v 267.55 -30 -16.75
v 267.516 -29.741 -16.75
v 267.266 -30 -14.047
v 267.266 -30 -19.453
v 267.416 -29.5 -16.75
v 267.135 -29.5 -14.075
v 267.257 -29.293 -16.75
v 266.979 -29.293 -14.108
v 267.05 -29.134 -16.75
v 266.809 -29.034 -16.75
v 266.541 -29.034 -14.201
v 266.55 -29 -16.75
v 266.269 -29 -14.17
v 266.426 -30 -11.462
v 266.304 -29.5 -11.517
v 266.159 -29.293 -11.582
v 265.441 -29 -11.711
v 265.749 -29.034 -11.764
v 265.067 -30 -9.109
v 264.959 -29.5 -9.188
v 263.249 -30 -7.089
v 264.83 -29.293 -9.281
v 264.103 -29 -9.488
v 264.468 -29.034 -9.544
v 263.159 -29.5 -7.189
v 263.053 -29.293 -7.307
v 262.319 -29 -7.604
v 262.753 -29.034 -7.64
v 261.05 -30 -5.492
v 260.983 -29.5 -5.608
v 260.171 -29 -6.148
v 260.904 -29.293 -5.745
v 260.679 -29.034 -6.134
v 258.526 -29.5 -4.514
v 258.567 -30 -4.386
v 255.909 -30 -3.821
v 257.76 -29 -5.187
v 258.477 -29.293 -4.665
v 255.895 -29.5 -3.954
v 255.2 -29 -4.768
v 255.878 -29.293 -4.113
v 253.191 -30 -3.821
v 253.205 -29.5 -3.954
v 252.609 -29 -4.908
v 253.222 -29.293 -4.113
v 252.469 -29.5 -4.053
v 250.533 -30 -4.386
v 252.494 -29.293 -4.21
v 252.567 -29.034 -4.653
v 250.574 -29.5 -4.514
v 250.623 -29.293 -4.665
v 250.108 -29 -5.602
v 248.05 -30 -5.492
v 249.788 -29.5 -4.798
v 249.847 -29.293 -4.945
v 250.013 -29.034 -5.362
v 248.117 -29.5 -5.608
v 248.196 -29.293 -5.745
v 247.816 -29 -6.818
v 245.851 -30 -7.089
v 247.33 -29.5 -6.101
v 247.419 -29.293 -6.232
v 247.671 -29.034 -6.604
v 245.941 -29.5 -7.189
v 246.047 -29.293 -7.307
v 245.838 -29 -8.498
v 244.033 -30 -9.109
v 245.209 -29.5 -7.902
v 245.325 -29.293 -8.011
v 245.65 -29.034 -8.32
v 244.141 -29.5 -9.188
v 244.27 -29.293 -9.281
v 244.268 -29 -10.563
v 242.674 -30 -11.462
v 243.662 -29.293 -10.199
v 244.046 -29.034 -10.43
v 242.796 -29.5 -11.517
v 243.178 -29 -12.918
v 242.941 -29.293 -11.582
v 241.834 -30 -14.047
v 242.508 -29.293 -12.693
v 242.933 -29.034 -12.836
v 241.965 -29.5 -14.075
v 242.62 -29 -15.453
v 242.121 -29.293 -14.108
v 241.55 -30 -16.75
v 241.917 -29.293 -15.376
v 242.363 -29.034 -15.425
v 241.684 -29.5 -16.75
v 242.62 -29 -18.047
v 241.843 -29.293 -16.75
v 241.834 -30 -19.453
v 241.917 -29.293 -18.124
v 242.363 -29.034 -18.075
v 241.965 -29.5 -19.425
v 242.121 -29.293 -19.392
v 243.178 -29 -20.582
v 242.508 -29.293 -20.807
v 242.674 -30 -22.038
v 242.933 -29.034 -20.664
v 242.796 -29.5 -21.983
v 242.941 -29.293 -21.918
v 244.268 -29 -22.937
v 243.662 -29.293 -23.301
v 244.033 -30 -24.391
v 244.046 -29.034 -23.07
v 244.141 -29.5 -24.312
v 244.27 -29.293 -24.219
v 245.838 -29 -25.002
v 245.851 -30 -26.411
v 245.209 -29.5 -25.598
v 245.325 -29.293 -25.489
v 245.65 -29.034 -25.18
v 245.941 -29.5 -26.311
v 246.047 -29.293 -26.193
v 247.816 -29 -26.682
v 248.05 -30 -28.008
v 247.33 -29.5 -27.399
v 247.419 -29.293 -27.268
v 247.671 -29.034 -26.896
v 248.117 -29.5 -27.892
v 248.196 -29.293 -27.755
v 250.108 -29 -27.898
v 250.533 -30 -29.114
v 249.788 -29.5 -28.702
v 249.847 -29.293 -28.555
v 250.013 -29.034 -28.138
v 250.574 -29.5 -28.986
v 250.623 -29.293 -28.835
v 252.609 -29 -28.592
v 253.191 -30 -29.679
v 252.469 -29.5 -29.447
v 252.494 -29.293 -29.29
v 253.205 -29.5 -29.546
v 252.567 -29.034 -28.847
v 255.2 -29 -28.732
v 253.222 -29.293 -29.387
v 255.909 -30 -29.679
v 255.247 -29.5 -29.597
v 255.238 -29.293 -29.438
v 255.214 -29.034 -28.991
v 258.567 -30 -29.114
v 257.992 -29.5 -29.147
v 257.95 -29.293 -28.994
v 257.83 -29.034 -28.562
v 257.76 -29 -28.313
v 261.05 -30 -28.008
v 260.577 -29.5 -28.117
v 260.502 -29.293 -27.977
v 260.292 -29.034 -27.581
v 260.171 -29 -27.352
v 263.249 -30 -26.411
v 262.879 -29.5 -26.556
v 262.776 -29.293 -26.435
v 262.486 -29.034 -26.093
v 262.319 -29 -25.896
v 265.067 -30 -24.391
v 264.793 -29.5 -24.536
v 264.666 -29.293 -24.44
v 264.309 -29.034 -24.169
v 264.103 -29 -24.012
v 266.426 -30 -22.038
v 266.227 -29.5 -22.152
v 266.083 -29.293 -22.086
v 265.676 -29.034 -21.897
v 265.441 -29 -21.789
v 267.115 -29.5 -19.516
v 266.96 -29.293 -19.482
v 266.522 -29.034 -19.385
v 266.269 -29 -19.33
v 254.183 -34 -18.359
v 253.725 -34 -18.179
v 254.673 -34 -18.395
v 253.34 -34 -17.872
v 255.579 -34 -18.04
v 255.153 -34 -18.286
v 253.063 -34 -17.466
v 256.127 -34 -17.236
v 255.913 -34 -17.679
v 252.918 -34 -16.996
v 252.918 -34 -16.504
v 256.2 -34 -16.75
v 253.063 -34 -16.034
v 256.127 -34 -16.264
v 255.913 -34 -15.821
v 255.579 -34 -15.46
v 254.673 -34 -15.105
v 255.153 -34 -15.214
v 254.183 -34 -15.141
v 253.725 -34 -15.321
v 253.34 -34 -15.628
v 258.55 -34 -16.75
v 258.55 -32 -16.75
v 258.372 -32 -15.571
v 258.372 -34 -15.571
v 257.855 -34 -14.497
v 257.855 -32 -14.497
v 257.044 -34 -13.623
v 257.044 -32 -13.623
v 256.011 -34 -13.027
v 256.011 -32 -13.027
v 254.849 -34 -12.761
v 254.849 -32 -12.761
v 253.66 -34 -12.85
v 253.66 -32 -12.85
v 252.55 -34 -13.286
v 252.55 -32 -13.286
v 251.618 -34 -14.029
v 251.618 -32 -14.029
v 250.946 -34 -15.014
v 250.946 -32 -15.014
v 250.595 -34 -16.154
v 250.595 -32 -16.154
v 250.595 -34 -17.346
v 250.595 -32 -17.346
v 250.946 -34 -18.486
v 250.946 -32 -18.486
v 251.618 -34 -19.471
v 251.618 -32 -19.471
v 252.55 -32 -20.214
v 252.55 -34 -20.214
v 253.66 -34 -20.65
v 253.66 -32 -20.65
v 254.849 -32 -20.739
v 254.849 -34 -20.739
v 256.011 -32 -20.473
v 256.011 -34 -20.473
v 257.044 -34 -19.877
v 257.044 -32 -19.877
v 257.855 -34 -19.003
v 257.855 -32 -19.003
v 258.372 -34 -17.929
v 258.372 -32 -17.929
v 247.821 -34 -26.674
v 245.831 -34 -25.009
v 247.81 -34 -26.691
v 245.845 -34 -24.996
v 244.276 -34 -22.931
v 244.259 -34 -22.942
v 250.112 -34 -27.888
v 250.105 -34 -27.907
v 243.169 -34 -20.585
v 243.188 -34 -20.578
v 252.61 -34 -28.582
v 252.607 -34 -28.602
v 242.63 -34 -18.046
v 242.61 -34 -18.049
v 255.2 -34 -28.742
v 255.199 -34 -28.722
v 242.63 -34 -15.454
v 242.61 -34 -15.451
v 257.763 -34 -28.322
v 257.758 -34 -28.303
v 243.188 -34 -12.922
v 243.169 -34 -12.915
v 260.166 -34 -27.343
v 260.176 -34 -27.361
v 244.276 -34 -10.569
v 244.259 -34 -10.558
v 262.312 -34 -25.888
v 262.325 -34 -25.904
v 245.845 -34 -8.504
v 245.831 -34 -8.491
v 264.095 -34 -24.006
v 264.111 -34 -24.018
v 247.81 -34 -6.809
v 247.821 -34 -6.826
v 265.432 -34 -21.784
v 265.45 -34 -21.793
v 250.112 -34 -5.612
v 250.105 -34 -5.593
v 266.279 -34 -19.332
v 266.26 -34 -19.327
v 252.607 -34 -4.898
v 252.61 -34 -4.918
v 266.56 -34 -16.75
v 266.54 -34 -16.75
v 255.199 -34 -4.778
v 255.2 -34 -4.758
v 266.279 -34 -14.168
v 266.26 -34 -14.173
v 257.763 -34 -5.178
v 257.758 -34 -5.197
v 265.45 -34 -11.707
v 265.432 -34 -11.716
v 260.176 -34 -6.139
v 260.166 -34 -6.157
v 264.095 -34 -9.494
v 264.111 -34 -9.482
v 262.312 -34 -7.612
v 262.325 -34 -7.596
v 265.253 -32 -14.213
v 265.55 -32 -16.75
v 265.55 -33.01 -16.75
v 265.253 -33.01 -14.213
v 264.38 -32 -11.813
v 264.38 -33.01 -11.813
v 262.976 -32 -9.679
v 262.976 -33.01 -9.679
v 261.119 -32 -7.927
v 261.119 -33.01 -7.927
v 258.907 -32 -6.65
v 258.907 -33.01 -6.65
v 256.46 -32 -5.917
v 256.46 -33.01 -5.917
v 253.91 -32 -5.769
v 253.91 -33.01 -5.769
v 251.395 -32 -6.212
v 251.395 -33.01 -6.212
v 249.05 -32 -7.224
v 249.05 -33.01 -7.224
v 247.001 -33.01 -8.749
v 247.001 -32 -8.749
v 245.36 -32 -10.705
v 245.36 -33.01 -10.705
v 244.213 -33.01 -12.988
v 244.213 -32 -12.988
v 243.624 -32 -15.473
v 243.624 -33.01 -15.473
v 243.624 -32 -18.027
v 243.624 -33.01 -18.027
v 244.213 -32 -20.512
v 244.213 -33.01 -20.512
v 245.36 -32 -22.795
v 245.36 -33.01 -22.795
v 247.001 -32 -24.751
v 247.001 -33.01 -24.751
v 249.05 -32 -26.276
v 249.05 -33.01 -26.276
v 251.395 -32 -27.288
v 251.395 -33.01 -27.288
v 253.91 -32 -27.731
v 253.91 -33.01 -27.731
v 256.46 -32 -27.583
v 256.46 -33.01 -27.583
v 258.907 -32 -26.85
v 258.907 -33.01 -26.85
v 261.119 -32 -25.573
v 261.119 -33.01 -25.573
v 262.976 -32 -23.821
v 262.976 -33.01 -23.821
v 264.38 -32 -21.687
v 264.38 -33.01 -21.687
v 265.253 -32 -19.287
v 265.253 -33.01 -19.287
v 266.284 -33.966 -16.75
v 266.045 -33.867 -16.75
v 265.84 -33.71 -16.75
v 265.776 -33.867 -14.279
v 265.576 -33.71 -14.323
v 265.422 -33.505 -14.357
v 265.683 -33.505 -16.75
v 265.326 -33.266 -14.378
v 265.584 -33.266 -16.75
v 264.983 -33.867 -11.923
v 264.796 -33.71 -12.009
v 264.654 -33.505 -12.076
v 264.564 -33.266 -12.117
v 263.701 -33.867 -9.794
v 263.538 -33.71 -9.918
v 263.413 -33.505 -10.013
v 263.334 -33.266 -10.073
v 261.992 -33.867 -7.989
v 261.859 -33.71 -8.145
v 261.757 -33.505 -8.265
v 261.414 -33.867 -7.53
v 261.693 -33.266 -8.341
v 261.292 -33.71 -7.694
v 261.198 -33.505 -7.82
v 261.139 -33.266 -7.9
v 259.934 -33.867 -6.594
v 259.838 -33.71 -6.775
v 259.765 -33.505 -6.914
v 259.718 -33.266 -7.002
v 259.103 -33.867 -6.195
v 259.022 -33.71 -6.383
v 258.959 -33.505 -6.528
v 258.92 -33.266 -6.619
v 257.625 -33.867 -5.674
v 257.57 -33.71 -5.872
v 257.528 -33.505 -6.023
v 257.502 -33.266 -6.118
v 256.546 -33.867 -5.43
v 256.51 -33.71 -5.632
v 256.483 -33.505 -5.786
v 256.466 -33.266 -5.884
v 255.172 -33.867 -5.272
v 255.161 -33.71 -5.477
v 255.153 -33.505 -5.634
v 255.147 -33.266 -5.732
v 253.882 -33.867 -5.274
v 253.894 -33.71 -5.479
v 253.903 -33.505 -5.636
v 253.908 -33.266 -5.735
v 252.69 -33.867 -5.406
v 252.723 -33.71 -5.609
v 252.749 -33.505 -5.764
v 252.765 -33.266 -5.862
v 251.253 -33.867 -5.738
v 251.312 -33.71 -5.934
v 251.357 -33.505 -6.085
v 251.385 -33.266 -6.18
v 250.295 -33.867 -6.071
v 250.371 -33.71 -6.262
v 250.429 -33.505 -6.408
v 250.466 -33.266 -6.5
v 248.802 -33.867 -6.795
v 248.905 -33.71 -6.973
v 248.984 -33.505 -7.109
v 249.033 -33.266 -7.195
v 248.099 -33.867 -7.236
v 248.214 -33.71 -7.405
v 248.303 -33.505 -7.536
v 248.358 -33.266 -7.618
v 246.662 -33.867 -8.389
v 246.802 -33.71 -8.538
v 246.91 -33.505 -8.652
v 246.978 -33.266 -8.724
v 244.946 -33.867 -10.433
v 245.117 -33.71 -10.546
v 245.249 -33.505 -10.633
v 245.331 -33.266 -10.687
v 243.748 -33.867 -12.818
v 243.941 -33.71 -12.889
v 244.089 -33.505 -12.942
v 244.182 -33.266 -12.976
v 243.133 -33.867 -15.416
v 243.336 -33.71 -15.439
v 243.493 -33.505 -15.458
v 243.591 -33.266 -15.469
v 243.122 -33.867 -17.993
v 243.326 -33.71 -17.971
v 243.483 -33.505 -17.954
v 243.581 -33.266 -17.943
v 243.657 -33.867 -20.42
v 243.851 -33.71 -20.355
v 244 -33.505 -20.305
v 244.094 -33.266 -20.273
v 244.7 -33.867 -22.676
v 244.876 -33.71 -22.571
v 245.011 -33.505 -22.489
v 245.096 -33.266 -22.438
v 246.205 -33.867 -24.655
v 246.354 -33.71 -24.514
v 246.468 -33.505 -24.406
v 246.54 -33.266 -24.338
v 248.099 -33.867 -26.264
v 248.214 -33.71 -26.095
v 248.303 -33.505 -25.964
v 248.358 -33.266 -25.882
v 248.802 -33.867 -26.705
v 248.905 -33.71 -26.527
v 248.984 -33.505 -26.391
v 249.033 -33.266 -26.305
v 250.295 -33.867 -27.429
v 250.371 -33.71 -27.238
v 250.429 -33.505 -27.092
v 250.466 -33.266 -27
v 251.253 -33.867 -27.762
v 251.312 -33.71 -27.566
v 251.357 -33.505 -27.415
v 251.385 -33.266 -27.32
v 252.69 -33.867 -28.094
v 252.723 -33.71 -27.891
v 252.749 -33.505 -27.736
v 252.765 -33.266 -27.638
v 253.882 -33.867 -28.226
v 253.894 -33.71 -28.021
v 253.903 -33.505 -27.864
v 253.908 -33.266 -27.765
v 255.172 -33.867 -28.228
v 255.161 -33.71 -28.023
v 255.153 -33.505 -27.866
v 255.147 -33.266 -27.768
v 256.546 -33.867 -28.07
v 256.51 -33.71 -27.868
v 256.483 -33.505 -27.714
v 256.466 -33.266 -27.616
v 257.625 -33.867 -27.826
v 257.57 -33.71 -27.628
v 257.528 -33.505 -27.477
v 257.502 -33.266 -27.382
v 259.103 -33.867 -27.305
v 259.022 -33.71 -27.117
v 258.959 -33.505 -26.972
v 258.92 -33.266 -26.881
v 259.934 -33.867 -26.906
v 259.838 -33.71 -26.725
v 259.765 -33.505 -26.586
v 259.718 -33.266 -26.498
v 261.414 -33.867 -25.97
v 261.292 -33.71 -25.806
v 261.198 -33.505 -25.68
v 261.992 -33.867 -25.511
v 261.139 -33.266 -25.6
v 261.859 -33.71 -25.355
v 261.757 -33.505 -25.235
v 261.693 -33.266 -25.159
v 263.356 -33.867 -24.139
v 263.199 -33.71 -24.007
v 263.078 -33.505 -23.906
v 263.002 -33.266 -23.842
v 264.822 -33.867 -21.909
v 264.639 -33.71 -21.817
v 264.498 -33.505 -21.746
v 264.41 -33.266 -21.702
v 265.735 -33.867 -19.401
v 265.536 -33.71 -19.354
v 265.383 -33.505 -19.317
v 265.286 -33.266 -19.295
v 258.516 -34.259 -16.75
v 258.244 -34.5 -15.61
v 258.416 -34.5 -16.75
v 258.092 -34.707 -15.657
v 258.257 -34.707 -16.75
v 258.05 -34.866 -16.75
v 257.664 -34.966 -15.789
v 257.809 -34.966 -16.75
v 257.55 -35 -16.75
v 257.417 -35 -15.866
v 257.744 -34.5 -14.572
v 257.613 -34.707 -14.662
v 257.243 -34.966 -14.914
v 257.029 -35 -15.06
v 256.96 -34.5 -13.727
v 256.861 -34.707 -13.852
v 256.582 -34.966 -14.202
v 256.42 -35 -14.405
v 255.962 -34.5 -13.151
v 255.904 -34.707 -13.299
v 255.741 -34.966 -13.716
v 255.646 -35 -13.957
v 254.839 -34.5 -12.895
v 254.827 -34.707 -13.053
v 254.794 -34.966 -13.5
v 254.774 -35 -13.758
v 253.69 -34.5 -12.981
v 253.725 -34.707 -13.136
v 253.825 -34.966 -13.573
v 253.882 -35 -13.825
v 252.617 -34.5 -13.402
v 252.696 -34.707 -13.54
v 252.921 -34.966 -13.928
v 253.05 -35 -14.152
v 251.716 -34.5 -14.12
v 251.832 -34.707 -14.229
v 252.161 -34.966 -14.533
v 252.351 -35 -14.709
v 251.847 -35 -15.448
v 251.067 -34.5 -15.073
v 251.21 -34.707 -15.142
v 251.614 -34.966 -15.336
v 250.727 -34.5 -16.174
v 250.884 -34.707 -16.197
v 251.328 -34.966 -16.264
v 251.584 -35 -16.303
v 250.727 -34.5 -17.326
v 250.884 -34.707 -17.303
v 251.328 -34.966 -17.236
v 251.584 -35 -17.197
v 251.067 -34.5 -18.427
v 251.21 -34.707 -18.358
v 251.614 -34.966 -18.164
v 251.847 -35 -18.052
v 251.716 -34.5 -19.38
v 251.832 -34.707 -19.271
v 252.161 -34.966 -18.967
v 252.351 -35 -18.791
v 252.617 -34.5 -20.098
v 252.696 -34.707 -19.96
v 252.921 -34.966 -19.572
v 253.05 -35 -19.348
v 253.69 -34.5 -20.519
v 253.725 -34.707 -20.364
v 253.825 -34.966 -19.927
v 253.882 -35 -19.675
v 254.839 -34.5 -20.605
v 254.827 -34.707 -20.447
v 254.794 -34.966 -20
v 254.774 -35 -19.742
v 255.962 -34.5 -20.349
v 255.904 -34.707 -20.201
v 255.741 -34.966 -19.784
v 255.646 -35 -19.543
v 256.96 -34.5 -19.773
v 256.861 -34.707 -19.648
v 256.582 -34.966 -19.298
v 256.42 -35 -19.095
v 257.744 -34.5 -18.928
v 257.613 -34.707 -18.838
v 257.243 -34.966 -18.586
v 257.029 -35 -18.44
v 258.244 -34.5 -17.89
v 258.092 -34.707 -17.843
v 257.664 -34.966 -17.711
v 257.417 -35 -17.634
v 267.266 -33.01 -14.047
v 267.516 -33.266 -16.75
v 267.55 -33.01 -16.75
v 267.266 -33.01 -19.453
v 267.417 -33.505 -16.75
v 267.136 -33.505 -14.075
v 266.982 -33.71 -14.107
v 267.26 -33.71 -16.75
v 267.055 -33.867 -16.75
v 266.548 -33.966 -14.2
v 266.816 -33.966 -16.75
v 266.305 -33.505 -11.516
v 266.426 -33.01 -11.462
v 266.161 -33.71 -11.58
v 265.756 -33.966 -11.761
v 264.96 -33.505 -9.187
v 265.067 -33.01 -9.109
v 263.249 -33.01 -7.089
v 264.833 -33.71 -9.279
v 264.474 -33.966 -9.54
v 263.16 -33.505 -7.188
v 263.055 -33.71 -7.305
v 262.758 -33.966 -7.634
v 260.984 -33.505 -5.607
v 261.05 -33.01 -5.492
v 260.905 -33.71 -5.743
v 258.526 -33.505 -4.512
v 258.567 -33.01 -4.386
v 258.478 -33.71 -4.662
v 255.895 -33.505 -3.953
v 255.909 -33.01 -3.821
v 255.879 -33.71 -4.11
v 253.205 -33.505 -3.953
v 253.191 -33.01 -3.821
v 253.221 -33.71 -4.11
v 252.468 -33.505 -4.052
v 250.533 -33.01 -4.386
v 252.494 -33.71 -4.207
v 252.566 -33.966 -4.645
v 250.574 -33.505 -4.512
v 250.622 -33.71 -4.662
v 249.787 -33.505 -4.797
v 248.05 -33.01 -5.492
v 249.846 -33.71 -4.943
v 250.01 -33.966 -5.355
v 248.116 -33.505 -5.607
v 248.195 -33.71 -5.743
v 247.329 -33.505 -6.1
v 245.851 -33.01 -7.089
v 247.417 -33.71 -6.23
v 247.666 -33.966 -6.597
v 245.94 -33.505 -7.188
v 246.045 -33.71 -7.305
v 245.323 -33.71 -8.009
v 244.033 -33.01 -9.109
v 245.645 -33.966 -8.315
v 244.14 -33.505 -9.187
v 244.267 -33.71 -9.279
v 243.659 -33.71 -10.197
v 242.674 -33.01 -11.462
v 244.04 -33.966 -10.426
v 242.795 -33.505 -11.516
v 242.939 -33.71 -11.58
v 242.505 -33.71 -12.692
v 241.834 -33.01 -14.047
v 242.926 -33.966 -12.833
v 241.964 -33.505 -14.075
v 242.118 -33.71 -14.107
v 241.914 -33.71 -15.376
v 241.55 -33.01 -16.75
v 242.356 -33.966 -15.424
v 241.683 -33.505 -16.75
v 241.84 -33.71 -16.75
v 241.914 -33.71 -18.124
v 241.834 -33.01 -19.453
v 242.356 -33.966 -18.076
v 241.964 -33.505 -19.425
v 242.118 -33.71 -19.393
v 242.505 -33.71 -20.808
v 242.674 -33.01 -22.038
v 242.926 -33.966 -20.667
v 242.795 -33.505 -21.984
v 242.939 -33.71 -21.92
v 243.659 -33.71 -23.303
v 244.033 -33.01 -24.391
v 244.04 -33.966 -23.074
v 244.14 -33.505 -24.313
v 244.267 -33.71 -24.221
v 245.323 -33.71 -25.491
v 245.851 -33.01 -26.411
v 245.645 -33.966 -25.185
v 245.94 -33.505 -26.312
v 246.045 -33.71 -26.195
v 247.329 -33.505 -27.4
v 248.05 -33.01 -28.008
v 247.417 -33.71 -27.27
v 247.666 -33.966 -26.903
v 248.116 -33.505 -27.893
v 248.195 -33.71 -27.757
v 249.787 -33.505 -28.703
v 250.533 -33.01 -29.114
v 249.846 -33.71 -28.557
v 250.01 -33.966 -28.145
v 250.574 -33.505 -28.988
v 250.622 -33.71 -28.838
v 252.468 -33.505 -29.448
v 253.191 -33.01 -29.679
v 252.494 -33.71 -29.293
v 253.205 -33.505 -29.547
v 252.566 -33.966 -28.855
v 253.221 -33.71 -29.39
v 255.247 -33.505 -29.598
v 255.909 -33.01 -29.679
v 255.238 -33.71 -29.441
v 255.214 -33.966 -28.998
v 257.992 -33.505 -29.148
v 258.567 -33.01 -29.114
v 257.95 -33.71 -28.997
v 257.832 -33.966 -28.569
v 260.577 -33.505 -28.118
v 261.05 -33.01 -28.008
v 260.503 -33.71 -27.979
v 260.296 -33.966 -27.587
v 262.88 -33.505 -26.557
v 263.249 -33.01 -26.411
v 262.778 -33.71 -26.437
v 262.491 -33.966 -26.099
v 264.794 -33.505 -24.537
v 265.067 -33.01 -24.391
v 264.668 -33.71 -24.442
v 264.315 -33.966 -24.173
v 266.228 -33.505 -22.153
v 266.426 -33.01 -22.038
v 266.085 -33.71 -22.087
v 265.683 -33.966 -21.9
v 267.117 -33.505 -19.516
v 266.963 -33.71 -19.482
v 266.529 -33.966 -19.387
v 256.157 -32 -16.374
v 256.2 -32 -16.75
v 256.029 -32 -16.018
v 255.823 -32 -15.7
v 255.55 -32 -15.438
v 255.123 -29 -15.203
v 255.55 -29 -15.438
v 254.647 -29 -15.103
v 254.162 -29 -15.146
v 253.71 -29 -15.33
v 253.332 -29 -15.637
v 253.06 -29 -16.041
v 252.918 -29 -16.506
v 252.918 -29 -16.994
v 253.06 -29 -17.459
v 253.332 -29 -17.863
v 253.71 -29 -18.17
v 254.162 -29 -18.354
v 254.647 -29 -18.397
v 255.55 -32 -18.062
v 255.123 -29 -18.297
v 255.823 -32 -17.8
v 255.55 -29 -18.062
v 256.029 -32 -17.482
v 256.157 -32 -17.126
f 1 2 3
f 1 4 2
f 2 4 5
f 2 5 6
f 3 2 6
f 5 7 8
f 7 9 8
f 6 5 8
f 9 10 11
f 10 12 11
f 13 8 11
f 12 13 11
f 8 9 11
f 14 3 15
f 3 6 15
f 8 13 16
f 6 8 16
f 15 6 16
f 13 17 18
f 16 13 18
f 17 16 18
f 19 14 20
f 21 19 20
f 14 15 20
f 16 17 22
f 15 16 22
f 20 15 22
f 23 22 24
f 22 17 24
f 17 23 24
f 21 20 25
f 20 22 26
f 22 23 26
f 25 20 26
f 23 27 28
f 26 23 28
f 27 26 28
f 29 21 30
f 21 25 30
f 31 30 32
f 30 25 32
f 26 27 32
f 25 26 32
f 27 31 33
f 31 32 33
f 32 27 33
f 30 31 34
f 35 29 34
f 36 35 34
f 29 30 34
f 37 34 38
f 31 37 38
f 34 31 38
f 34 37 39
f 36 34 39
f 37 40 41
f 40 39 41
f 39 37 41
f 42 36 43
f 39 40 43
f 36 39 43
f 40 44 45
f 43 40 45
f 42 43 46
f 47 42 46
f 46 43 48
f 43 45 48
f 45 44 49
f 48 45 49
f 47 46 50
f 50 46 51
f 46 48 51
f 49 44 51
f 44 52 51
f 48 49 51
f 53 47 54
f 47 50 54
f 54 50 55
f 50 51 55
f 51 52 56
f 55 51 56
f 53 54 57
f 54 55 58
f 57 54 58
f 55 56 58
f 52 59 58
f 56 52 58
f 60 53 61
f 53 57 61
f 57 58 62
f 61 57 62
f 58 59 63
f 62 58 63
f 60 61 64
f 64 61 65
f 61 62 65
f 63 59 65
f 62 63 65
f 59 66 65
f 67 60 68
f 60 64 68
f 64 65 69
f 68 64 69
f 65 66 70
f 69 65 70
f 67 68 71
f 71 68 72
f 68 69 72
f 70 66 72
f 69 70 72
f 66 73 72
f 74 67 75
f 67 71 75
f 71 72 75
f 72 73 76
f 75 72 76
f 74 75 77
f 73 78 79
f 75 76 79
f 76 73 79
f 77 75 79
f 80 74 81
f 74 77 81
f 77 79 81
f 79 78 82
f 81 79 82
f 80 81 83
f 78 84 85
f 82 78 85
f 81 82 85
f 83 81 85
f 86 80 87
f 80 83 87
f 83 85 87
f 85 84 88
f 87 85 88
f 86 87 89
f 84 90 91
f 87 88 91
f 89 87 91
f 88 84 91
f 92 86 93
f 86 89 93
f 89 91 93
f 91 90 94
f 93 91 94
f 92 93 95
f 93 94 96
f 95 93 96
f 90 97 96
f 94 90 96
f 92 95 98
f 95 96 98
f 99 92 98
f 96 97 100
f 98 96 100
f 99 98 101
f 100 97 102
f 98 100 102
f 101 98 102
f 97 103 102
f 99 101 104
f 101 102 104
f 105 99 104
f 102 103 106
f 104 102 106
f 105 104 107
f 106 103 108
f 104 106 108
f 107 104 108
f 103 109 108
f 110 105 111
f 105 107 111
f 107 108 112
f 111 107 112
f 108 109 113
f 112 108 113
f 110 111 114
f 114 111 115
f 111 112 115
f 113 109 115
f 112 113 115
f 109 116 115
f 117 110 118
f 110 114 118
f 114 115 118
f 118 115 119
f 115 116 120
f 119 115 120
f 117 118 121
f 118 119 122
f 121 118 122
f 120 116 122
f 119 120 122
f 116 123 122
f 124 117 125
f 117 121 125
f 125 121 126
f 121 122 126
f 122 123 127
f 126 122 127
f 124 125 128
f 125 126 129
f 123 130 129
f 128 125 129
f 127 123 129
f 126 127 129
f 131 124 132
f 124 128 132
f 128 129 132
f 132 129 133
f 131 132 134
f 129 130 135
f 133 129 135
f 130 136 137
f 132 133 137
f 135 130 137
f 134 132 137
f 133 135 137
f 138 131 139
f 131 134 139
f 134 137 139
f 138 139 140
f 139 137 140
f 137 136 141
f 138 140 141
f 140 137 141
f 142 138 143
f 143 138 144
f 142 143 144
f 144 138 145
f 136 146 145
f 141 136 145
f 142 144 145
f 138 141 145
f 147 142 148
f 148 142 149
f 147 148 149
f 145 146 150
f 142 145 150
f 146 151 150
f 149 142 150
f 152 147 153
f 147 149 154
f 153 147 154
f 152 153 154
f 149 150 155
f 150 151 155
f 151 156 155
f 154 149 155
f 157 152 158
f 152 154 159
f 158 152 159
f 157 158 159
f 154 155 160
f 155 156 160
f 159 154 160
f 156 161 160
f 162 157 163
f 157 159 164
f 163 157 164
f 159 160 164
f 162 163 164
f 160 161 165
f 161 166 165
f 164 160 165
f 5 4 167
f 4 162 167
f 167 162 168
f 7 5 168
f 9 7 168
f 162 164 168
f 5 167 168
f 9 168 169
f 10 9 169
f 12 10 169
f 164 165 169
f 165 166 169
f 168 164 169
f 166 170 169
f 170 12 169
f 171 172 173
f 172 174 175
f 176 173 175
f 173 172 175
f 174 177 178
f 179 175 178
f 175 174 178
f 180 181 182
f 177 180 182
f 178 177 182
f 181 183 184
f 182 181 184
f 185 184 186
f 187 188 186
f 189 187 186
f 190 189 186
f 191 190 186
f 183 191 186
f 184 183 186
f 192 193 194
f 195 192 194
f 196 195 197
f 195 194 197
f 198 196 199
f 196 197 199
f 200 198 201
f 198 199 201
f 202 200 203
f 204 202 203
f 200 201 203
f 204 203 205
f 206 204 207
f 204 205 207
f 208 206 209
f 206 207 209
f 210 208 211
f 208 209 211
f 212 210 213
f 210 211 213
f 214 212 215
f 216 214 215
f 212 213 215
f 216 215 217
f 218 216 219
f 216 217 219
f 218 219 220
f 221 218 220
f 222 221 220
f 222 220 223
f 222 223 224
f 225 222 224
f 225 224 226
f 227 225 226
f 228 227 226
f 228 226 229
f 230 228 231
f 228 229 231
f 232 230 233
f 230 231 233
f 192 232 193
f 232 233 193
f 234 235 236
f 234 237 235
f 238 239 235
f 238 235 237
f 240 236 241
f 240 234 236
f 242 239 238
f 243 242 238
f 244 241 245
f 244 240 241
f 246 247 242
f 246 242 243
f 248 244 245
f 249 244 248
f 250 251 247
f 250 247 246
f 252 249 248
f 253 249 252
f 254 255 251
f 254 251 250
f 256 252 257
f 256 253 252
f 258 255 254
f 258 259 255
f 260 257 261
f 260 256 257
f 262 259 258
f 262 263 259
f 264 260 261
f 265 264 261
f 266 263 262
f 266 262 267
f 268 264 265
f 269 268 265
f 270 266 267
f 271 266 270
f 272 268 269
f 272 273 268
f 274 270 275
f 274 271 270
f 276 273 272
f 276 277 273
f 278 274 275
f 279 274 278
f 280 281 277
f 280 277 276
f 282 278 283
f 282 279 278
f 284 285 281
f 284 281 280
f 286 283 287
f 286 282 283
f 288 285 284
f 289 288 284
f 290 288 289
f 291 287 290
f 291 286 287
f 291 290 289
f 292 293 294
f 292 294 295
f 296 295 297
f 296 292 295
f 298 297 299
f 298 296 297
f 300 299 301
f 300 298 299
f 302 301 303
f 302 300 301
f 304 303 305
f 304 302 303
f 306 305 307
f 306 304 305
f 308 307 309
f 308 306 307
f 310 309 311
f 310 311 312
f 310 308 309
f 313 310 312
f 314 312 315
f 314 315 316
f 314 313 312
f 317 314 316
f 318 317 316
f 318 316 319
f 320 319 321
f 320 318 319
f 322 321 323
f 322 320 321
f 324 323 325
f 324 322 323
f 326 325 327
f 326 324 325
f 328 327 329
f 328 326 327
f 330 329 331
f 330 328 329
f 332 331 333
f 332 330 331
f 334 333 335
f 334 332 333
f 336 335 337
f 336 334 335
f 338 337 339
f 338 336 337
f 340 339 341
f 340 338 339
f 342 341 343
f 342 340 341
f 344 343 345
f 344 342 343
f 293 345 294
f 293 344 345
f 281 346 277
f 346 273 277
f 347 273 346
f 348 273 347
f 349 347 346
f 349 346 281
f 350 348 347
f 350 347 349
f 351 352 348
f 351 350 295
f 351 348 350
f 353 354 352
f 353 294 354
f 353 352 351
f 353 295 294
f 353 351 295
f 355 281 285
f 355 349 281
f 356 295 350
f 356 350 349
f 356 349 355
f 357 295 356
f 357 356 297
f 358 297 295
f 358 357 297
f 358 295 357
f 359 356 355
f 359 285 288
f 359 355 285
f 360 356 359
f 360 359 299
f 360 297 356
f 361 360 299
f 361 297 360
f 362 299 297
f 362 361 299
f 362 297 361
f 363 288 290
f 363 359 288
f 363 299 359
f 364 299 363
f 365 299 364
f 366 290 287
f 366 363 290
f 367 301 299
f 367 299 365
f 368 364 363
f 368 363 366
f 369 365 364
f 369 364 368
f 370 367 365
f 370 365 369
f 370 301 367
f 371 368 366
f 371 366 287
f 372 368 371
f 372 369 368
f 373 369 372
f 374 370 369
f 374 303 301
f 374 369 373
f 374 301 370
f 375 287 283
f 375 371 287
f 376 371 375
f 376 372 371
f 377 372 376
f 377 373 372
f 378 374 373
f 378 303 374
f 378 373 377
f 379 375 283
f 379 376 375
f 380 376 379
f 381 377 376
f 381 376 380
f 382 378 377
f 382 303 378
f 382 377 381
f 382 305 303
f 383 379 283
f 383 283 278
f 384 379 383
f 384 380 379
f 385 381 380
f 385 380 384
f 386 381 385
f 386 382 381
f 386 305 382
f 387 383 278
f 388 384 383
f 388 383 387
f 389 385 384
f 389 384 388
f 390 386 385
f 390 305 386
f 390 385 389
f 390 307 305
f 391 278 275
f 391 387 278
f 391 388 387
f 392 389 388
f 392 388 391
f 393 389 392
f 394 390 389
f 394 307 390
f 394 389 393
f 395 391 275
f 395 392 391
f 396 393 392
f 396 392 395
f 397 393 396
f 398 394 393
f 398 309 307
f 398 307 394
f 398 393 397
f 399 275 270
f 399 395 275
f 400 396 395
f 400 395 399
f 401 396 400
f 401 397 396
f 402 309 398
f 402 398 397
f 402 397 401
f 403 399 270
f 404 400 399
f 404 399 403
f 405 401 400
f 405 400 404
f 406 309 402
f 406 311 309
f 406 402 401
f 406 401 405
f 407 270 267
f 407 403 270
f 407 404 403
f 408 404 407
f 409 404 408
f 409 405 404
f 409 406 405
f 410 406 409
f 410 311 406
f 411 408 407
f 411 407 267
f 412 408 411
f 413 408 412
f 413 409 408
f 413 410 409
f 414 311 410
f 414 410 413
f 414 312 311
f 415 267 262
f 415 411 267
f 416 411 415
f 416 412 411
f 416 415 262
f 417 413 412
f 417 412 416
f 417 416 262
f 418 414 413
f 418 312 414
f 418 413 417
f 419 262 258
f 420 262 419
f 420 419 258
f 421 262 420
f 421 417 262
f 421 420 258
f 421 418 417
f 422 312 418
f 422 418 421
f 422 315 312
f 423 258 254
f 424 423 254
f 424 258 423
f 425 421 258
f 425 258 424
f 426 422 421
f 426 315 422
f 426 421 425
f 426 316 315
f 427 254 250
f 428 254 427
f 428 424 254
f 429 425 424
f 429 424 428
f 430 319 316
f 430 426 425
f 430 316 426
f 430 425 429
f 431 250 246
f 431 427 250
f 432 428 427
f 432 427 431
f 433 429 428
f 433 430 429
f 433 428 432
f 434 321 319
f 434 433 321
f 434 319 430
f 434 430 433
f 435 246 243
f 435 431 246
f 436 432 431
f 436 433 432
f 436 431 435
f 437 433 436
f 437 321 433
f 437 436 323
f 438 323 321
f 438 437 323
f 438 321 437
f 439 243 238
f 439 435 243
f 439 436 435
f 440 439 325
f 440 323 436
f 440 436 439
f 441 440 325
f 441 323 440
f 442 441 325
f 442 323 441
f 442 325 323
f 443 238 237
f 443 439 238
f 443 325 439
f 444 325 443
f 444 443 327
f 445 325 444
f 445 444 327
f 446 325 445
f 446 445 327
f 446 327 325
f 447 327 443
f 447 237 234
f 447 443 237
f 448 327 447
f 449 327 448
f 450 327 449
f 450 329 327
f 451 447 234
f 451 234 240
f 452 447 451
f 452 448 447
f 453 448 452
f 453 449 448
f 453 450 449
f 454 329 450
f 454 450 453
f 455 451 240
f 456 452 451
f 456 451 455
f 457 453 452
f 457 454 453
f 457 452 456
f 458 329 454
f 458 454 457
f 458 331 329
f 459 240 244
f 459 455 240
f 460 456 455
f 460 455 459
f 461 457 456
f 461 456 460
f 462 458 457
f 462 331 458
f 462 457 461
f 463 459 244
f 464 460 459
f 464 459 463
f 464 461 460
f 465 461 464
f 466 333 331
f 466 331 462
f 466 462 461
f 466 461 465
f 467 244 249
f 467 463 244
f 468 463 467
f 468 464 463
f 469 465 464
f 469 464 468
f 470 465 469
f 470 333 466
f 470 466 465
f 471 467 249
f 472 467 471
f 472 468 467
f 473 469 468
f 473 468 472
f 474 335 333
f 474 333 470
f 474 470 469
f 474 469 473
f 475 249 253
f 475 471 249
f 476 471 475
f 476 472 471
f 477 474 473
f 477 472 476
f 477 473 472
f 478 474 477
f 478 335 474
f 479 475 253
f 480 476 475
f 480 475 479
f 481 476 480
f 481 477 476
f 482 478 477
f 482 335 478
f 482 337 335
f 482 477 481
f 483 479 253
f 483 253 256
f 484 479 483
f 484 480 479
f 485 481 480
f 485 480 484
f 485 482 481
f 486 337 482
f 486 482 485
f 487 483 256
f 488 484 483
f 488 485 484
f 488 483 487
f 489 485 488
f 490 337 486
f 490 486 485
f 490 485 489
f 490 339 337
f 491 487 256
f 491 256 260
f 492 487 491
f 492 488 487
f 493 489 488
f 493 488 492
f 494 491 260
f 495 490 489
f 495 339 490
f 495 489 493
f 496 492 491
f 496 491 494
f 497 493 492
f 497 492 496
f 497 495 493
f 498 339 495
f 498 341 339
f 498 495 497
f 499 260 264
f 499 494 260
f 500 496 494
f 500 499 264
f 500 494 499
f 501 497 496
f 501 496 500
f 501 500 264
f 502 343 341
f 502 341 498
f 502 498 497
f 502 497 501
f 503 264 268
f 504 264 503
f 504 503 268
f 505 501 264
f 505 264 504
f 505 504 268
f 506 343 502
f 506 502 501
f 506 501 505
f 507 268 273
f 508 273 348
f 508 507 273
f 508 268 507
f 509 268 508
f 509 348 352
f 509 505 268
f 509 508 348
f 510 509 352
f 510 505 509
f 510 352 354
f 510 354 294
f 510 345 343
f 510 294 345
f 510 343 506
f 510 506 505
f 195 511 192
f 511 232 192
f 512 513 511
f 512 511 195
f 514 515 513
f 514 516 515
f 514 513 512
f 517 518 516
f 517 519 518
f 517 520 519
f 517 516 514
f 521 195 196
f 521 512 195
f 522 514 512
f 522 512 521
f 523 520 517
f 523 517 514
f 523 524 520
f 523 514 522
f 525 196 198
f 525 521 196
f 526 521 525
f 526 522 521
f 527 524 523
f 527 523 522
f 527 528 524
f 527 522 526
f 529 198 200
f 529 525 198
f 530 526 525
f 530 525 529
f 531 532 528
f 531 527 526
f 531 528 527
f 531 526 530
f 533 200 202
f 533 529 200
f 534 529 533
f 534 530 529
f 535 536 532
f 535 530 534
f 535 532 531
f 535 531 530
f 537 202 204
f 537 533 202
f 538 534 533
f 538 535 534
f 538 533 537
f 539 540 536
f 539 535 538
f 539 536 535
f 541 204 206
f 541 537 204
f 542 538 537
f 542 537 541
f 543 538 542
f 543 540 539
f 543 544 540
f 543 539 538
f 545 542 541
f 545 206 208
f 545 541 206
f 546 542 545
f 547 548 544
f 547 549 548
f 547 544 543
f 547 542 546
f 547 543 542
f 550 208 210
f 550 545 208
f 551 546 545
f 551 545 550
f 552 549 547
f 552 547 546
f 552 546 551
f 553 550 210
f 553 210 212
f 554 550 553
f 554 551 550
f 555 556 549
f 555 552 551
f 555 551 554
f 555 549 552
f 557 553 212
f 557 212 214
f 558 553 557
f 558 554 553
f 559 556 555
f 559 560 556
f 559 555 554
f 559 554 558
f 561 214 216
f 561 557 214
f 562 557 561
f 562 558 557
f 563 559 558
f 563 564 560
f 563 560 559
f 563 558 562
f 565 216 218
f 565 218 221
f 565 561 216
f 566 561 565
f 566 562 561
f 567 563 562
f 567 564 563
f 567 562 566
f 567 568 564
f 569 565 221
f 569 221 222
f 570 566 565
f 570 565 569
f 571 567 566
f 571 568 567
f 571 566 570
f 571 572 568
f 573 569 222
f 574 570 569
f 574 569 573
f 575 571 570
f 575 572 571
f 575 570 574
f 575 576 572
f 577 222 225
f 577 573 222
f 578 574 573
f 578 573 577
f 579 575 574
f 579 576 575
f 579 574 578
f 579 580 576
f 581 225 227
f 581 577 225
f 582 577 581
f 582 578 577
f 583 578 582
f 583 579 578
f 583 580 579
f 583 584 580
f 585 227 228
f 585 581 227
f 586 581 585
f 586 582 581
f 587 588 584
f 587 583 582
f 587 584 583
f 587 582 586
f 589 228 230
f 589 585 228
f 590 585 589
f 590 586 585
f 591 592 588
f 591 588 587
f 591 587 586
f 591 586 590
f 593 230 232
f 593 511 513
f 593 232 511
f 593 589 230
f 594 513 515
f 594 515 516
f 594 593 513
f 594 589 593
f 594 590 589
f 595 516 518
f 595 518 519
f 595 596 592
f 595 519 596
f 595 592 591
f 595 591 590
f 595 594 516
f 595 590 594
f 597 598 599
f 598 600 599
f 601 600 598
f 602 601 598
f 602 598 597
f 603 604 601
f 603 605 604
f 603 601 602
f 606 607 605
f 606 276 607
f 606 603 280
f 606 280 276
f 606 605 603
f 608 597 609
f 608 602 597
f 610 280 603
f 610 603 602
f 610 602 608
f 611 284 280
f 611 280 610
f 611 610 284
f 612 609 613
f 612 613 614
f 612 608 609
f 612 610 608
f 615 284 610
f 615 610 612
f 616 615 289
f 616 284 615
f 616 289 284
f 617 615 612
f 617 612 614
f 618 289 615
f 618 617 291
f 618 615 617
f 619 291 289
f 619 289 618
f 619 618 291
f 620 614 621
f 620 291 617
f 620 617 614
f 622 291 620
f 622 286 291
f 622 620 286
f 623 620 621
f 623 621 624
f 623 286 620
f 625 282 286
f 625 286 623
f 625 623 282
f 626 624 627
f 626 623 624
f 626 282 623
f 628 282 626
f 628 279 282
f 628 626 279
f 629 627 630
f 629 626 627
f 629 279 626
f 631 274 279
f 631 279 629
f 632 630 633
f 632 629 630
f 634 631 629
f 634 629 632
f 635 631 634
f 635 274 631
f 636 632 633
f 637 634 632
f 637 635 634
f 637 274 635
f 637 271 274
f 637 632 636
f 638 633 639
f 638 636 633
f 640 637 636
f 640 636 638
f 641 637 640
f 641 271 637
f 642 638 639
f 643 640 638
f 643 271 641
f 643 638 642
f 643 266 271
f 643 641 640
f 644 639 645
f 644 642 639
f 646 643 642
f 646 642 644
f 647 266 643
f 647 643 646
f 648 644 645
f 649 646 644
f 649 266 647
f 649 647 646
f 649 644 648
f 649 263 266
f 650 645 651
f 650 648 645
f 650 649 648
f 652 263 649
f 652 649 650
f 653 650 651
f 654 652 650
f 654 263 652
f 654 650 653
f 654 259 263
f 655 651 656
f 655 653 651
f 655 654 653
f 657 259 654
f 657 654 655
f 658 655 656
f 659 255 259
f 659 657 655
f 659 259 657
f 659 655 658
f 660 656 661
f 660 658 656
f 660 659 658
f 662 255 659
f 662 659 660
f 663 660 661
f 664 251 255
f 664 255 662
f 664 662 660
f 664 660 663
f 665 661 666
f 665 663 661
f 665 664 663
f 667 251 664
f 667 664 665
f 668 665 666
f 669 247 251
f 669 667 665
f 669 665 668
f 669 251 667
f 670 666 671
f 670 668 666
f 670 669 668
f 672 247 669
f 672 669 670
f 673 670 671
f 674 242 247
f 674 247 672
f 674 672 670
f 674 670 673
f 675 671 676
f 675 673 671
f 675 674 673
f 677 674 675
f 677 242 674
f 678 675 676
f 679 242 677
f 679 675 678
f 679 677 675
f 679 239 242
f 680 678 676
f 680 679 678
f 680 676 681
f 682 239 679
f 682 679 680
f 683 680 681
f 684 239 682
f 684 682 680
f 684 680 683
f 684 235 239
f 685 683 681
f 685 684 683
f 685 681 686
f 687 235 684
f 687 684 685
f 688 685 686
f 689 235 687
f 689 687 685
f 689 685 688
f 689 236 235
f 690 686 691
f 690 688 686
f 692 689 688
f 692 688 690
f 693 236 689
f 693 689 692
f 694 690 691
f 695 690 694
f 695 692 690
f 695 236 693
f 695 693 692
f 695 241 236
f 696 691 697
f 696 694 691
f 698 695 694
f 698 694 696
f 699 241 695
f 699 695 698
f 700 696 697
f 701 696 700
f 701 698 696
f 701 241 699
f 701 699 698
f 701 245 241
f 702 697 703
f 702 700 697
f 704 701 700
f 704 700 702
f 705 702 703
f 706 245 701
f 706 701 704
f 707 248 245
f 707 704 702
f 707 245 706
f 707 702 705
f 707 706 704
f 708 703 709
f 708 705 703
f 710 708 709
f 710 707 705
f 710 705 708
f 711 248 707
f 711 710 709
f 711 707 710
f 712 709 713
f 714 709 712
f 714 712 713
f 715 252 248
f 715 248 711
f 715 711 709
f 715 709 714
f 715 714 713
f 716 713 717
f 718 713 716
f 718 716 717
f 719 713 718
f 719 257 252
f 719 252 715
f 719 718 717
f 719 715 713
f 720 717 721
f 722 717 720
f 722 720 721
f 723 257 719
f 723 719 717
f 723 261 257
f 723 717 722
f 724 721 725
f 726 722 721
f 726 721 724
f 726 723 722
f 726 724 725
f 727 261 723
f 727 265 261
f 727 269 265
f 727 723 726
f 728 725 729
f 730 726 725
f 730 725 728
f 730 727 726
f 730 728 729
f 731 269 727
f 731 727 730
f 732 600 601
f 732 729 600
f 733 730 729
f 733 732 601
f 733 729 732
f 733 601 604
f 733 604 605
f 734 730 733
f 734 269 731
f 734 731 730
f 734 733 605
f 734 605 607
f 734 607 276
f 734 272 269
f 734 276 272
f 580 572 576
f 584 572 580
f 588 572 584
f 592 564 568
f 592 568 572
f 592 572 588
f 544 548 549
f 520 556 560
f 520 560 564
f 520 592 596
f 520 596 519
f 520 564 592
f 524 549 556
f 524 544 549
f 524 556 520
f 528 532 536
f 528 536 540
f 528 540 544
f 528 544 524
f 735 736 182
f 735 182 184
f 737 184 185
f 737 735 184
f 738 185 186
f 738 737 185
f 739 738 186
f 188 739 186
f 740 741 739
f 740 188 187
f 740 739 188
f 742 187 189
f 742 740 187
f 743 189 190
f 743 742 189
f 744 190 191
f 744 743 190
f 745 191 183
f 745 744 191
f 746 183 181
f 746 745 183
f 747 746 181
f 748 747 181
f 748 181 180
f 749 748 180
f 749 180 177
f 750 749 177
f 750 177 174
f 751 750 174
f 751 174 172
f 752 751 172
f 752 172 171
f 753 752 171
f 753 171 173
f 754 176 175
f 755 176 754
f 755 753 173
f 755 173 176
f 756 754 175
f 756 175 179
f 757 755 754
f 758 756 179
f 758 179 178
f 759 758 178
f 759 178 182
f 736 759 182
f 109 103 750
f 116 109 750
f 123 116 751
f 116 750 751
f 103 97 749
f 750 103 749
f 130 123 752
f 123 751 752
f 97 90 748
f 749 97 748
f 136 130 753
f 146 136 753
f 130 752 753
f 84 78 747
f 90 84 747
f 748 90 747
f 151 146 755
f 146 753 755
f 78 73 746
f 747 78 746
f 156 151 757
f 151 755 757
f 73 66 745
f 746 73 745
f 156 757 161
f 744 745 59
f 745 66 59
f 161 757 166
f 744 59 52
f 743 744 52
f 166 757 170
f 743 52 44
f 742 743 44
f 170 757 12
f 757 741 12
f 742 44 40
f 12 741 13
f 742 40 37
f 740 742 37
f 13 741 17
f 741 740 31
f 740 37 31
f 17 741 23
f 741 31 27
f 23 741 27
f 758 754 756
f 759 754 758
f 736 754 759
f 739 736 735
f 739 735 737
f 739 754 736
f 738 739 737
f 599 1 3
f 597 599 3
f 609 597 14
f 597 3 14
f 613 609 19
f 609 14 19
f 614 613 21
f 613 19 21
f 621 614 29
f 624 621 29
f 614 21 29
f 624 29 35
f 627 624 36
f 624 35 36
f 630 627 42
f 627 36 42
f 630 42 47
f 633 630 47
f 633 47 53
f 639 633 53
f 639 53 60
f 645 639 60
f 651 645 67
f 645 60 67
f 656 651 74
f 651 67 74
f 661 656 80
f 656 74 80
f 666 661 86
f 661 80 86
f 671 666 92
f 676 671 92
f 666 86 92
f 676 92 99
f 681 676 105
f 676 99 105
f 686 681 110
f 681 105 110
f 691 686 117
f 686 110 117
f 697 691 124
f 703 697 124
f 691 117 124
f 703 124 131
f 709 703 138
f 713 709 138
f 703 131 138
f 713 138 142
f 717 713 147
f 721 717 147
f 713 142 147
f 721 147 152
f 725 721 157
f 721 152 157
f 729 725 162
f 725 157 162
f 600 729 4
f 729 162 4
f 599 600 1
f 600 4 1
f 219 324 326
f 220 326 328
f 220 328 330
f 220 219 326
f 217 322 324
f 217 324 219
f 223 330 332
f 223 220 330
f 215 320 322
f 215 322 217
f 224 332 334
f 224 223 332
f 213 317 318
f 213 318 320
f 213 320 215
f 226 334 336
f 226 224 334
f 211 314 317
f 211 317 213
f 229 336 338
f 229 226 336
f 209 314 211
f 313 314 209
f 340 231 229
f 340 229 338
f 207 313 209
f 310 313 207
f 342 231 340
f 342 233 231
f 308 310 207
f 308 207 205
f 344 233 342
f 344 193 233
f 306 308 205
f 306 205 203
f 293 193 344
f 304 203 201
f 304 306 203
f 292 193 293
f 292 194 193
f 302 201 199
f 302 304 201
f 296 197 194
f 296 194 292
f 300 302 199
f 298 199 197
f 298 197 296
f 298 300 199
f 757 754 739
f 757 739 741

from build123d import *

# Parameters (mm, degrees)
CYLINDER236_R     = 11
CYLINDER236_DEPTH = 2
CYLINDER235_R     = 1.65
CYLINDER235_DEPTH = 5
CYLINDER234_R     = 13
CYLINDER234_DEPTH = 5
BOX161_W          = 10
BOX161_H          = 12
BOX161_DEPTH      = 10
CYLINDER233_R     = 1.65
CYLINDER233_DEPTH = 5
FILLET067_R       = 0.99
FILLET066_R       = 1
CYLINDER232_R     = 1.65
CYLINDER232_DEPTH = 2
CYLINDER231_R     = 4
CYLINDER231_DEPTH = 3
FILLET065_R       = 1


with BuildPart() as cylinder519:
    # Cylinder236 → Cylinder236 (new body)
    with BuildSketch(Plane(origin=(333.25, -23, -34.25), x_dir=(1, 0, 0), z_dir=(0, -1, 0))):
        Circle(CYLINDER236_R)
    extrude(amount=CYLINDER236_DEPTH)


with BuildPart() as cylinder517:
    # Cylinder235 → Cylinder235 (new body)
    with BuildSketch(Plane(origin=(333.25, -20, -34.25), x_dir=(1, 0, 0), z_dir=(0, -1, 0))):
        Circle(CYLINDER235_R)
    extrude(amount=CYLINDER235_DEPTH)


with BuildPart() as cut172:
    # Cylinder234 → Cylinder234 (new body)
    with BuildSketch(Plane(origin=(333.25, -20, -34.25), x_dir=(1, 0, 0), z_dir=(0, -1, 0))):
        Circle(CYLINDER234_R)
    extrude(amount=CYLINDER234_DEPTH)

    # Cut172: cut Cylinder517
    add(cylinder517.part, mode=Mode.SUBTRACT)


with BuildPart() as cube257:
    # Box161 → Box161 (new body)
    with BuildSketch(Plane(origin=(320.25, -4, -55), x_dir=(1, 0, 0), z_dir=(0, 0, 1))):
        with Locations((5, 6)):
            Rectangle(BOX161_W, BOX161_H)
    extrude(amount=BOX161_DEPTH)


with BuildPart() as fillet066:
    # Cylinder233 → Cylinder233 (new body)
    with BuildSketch(Plane(origin=(329.25, 8, -49), x_dir=(1, 0, 0), z_dir=(0, -1, 0))):
        Circle(CYLINDER233_R)
    extrude(amount=CYLINDER233_DEPTH)

    # Cut171: cut Cube257
    add(cube257.part, mode=Mode.SUBTRACT)


with BuildPart() as fillet066_1:
    # Cut171 placement: moved
    add(fillet066.part.moved(Location((4, -28, 14.75))))

    # Fusion199: union Cut172
    add(cut172.part)

    # Cut170: cut Cylinder519
    add(cylinder519.part, mode=Mode.SUBTRACT)

    # Fillet067
    fillet067_edges = [fillet066_1.edges().sort_by_distance(p)[0] for p in [
        (320.25, -25, -34.25),
        (322.25, -25, -34.25),
    ]]
    fillet(fillet067_edges, radius=FILLET067_R)

    # Fillet066
    fillet066_edges = [fillet066_1.edges().sort_by_distance(p)[0] for p in [
        (320.25, -20, -34.25),
    ]]
    fillet(fillet066_edges, radius=FILLET066_R)


with BuildPart() as cylinder520:
    # Cylinder232 → Cylinder232 (new body)
    with BuildSketch(Plane(origin=(333.25, -23, -34.25), x_dir=(1, 0, 0), z_dir=(0, -1, 0))):
        Circle(CYLINDER232_R)
    extrude(amount=CYLINDER232_DEPTH)


with BuildPart() as supports_wheel:
    # Cylinder231 → Cylinder231 (new body)
    with BuildSketch(Plane(origin=(333.25, -23, -34.25), x_dir=(1, 0, 0), z_dir=(0, -1, 0))):
        Circle(CYLINDER231_R)
    extrude(amount=CYLINDER231_DEPTH)

    # Cut169: cut Cylinder520
    add(cylinder520.part, mode=Mode.SUBTRACT)

    # Fillet065
    fillet065_edges = [supports_wheel.edges().sort_by_distance(p)[0] for p in [
        (329.25, -26, -34.25),
    ]]
    fillet(fillet065_edges, radius=FILLET065_R)

    # Fusion198: union Fillet066
    add(fillet066_1.part)


with BuildPart() as supports_wheel_1:
    # Fusion198 placement: moved
    add(supports_wheel.part.moved(Location((-78.7, -9, 17.5))))


solid = supports_wheel_1.part
